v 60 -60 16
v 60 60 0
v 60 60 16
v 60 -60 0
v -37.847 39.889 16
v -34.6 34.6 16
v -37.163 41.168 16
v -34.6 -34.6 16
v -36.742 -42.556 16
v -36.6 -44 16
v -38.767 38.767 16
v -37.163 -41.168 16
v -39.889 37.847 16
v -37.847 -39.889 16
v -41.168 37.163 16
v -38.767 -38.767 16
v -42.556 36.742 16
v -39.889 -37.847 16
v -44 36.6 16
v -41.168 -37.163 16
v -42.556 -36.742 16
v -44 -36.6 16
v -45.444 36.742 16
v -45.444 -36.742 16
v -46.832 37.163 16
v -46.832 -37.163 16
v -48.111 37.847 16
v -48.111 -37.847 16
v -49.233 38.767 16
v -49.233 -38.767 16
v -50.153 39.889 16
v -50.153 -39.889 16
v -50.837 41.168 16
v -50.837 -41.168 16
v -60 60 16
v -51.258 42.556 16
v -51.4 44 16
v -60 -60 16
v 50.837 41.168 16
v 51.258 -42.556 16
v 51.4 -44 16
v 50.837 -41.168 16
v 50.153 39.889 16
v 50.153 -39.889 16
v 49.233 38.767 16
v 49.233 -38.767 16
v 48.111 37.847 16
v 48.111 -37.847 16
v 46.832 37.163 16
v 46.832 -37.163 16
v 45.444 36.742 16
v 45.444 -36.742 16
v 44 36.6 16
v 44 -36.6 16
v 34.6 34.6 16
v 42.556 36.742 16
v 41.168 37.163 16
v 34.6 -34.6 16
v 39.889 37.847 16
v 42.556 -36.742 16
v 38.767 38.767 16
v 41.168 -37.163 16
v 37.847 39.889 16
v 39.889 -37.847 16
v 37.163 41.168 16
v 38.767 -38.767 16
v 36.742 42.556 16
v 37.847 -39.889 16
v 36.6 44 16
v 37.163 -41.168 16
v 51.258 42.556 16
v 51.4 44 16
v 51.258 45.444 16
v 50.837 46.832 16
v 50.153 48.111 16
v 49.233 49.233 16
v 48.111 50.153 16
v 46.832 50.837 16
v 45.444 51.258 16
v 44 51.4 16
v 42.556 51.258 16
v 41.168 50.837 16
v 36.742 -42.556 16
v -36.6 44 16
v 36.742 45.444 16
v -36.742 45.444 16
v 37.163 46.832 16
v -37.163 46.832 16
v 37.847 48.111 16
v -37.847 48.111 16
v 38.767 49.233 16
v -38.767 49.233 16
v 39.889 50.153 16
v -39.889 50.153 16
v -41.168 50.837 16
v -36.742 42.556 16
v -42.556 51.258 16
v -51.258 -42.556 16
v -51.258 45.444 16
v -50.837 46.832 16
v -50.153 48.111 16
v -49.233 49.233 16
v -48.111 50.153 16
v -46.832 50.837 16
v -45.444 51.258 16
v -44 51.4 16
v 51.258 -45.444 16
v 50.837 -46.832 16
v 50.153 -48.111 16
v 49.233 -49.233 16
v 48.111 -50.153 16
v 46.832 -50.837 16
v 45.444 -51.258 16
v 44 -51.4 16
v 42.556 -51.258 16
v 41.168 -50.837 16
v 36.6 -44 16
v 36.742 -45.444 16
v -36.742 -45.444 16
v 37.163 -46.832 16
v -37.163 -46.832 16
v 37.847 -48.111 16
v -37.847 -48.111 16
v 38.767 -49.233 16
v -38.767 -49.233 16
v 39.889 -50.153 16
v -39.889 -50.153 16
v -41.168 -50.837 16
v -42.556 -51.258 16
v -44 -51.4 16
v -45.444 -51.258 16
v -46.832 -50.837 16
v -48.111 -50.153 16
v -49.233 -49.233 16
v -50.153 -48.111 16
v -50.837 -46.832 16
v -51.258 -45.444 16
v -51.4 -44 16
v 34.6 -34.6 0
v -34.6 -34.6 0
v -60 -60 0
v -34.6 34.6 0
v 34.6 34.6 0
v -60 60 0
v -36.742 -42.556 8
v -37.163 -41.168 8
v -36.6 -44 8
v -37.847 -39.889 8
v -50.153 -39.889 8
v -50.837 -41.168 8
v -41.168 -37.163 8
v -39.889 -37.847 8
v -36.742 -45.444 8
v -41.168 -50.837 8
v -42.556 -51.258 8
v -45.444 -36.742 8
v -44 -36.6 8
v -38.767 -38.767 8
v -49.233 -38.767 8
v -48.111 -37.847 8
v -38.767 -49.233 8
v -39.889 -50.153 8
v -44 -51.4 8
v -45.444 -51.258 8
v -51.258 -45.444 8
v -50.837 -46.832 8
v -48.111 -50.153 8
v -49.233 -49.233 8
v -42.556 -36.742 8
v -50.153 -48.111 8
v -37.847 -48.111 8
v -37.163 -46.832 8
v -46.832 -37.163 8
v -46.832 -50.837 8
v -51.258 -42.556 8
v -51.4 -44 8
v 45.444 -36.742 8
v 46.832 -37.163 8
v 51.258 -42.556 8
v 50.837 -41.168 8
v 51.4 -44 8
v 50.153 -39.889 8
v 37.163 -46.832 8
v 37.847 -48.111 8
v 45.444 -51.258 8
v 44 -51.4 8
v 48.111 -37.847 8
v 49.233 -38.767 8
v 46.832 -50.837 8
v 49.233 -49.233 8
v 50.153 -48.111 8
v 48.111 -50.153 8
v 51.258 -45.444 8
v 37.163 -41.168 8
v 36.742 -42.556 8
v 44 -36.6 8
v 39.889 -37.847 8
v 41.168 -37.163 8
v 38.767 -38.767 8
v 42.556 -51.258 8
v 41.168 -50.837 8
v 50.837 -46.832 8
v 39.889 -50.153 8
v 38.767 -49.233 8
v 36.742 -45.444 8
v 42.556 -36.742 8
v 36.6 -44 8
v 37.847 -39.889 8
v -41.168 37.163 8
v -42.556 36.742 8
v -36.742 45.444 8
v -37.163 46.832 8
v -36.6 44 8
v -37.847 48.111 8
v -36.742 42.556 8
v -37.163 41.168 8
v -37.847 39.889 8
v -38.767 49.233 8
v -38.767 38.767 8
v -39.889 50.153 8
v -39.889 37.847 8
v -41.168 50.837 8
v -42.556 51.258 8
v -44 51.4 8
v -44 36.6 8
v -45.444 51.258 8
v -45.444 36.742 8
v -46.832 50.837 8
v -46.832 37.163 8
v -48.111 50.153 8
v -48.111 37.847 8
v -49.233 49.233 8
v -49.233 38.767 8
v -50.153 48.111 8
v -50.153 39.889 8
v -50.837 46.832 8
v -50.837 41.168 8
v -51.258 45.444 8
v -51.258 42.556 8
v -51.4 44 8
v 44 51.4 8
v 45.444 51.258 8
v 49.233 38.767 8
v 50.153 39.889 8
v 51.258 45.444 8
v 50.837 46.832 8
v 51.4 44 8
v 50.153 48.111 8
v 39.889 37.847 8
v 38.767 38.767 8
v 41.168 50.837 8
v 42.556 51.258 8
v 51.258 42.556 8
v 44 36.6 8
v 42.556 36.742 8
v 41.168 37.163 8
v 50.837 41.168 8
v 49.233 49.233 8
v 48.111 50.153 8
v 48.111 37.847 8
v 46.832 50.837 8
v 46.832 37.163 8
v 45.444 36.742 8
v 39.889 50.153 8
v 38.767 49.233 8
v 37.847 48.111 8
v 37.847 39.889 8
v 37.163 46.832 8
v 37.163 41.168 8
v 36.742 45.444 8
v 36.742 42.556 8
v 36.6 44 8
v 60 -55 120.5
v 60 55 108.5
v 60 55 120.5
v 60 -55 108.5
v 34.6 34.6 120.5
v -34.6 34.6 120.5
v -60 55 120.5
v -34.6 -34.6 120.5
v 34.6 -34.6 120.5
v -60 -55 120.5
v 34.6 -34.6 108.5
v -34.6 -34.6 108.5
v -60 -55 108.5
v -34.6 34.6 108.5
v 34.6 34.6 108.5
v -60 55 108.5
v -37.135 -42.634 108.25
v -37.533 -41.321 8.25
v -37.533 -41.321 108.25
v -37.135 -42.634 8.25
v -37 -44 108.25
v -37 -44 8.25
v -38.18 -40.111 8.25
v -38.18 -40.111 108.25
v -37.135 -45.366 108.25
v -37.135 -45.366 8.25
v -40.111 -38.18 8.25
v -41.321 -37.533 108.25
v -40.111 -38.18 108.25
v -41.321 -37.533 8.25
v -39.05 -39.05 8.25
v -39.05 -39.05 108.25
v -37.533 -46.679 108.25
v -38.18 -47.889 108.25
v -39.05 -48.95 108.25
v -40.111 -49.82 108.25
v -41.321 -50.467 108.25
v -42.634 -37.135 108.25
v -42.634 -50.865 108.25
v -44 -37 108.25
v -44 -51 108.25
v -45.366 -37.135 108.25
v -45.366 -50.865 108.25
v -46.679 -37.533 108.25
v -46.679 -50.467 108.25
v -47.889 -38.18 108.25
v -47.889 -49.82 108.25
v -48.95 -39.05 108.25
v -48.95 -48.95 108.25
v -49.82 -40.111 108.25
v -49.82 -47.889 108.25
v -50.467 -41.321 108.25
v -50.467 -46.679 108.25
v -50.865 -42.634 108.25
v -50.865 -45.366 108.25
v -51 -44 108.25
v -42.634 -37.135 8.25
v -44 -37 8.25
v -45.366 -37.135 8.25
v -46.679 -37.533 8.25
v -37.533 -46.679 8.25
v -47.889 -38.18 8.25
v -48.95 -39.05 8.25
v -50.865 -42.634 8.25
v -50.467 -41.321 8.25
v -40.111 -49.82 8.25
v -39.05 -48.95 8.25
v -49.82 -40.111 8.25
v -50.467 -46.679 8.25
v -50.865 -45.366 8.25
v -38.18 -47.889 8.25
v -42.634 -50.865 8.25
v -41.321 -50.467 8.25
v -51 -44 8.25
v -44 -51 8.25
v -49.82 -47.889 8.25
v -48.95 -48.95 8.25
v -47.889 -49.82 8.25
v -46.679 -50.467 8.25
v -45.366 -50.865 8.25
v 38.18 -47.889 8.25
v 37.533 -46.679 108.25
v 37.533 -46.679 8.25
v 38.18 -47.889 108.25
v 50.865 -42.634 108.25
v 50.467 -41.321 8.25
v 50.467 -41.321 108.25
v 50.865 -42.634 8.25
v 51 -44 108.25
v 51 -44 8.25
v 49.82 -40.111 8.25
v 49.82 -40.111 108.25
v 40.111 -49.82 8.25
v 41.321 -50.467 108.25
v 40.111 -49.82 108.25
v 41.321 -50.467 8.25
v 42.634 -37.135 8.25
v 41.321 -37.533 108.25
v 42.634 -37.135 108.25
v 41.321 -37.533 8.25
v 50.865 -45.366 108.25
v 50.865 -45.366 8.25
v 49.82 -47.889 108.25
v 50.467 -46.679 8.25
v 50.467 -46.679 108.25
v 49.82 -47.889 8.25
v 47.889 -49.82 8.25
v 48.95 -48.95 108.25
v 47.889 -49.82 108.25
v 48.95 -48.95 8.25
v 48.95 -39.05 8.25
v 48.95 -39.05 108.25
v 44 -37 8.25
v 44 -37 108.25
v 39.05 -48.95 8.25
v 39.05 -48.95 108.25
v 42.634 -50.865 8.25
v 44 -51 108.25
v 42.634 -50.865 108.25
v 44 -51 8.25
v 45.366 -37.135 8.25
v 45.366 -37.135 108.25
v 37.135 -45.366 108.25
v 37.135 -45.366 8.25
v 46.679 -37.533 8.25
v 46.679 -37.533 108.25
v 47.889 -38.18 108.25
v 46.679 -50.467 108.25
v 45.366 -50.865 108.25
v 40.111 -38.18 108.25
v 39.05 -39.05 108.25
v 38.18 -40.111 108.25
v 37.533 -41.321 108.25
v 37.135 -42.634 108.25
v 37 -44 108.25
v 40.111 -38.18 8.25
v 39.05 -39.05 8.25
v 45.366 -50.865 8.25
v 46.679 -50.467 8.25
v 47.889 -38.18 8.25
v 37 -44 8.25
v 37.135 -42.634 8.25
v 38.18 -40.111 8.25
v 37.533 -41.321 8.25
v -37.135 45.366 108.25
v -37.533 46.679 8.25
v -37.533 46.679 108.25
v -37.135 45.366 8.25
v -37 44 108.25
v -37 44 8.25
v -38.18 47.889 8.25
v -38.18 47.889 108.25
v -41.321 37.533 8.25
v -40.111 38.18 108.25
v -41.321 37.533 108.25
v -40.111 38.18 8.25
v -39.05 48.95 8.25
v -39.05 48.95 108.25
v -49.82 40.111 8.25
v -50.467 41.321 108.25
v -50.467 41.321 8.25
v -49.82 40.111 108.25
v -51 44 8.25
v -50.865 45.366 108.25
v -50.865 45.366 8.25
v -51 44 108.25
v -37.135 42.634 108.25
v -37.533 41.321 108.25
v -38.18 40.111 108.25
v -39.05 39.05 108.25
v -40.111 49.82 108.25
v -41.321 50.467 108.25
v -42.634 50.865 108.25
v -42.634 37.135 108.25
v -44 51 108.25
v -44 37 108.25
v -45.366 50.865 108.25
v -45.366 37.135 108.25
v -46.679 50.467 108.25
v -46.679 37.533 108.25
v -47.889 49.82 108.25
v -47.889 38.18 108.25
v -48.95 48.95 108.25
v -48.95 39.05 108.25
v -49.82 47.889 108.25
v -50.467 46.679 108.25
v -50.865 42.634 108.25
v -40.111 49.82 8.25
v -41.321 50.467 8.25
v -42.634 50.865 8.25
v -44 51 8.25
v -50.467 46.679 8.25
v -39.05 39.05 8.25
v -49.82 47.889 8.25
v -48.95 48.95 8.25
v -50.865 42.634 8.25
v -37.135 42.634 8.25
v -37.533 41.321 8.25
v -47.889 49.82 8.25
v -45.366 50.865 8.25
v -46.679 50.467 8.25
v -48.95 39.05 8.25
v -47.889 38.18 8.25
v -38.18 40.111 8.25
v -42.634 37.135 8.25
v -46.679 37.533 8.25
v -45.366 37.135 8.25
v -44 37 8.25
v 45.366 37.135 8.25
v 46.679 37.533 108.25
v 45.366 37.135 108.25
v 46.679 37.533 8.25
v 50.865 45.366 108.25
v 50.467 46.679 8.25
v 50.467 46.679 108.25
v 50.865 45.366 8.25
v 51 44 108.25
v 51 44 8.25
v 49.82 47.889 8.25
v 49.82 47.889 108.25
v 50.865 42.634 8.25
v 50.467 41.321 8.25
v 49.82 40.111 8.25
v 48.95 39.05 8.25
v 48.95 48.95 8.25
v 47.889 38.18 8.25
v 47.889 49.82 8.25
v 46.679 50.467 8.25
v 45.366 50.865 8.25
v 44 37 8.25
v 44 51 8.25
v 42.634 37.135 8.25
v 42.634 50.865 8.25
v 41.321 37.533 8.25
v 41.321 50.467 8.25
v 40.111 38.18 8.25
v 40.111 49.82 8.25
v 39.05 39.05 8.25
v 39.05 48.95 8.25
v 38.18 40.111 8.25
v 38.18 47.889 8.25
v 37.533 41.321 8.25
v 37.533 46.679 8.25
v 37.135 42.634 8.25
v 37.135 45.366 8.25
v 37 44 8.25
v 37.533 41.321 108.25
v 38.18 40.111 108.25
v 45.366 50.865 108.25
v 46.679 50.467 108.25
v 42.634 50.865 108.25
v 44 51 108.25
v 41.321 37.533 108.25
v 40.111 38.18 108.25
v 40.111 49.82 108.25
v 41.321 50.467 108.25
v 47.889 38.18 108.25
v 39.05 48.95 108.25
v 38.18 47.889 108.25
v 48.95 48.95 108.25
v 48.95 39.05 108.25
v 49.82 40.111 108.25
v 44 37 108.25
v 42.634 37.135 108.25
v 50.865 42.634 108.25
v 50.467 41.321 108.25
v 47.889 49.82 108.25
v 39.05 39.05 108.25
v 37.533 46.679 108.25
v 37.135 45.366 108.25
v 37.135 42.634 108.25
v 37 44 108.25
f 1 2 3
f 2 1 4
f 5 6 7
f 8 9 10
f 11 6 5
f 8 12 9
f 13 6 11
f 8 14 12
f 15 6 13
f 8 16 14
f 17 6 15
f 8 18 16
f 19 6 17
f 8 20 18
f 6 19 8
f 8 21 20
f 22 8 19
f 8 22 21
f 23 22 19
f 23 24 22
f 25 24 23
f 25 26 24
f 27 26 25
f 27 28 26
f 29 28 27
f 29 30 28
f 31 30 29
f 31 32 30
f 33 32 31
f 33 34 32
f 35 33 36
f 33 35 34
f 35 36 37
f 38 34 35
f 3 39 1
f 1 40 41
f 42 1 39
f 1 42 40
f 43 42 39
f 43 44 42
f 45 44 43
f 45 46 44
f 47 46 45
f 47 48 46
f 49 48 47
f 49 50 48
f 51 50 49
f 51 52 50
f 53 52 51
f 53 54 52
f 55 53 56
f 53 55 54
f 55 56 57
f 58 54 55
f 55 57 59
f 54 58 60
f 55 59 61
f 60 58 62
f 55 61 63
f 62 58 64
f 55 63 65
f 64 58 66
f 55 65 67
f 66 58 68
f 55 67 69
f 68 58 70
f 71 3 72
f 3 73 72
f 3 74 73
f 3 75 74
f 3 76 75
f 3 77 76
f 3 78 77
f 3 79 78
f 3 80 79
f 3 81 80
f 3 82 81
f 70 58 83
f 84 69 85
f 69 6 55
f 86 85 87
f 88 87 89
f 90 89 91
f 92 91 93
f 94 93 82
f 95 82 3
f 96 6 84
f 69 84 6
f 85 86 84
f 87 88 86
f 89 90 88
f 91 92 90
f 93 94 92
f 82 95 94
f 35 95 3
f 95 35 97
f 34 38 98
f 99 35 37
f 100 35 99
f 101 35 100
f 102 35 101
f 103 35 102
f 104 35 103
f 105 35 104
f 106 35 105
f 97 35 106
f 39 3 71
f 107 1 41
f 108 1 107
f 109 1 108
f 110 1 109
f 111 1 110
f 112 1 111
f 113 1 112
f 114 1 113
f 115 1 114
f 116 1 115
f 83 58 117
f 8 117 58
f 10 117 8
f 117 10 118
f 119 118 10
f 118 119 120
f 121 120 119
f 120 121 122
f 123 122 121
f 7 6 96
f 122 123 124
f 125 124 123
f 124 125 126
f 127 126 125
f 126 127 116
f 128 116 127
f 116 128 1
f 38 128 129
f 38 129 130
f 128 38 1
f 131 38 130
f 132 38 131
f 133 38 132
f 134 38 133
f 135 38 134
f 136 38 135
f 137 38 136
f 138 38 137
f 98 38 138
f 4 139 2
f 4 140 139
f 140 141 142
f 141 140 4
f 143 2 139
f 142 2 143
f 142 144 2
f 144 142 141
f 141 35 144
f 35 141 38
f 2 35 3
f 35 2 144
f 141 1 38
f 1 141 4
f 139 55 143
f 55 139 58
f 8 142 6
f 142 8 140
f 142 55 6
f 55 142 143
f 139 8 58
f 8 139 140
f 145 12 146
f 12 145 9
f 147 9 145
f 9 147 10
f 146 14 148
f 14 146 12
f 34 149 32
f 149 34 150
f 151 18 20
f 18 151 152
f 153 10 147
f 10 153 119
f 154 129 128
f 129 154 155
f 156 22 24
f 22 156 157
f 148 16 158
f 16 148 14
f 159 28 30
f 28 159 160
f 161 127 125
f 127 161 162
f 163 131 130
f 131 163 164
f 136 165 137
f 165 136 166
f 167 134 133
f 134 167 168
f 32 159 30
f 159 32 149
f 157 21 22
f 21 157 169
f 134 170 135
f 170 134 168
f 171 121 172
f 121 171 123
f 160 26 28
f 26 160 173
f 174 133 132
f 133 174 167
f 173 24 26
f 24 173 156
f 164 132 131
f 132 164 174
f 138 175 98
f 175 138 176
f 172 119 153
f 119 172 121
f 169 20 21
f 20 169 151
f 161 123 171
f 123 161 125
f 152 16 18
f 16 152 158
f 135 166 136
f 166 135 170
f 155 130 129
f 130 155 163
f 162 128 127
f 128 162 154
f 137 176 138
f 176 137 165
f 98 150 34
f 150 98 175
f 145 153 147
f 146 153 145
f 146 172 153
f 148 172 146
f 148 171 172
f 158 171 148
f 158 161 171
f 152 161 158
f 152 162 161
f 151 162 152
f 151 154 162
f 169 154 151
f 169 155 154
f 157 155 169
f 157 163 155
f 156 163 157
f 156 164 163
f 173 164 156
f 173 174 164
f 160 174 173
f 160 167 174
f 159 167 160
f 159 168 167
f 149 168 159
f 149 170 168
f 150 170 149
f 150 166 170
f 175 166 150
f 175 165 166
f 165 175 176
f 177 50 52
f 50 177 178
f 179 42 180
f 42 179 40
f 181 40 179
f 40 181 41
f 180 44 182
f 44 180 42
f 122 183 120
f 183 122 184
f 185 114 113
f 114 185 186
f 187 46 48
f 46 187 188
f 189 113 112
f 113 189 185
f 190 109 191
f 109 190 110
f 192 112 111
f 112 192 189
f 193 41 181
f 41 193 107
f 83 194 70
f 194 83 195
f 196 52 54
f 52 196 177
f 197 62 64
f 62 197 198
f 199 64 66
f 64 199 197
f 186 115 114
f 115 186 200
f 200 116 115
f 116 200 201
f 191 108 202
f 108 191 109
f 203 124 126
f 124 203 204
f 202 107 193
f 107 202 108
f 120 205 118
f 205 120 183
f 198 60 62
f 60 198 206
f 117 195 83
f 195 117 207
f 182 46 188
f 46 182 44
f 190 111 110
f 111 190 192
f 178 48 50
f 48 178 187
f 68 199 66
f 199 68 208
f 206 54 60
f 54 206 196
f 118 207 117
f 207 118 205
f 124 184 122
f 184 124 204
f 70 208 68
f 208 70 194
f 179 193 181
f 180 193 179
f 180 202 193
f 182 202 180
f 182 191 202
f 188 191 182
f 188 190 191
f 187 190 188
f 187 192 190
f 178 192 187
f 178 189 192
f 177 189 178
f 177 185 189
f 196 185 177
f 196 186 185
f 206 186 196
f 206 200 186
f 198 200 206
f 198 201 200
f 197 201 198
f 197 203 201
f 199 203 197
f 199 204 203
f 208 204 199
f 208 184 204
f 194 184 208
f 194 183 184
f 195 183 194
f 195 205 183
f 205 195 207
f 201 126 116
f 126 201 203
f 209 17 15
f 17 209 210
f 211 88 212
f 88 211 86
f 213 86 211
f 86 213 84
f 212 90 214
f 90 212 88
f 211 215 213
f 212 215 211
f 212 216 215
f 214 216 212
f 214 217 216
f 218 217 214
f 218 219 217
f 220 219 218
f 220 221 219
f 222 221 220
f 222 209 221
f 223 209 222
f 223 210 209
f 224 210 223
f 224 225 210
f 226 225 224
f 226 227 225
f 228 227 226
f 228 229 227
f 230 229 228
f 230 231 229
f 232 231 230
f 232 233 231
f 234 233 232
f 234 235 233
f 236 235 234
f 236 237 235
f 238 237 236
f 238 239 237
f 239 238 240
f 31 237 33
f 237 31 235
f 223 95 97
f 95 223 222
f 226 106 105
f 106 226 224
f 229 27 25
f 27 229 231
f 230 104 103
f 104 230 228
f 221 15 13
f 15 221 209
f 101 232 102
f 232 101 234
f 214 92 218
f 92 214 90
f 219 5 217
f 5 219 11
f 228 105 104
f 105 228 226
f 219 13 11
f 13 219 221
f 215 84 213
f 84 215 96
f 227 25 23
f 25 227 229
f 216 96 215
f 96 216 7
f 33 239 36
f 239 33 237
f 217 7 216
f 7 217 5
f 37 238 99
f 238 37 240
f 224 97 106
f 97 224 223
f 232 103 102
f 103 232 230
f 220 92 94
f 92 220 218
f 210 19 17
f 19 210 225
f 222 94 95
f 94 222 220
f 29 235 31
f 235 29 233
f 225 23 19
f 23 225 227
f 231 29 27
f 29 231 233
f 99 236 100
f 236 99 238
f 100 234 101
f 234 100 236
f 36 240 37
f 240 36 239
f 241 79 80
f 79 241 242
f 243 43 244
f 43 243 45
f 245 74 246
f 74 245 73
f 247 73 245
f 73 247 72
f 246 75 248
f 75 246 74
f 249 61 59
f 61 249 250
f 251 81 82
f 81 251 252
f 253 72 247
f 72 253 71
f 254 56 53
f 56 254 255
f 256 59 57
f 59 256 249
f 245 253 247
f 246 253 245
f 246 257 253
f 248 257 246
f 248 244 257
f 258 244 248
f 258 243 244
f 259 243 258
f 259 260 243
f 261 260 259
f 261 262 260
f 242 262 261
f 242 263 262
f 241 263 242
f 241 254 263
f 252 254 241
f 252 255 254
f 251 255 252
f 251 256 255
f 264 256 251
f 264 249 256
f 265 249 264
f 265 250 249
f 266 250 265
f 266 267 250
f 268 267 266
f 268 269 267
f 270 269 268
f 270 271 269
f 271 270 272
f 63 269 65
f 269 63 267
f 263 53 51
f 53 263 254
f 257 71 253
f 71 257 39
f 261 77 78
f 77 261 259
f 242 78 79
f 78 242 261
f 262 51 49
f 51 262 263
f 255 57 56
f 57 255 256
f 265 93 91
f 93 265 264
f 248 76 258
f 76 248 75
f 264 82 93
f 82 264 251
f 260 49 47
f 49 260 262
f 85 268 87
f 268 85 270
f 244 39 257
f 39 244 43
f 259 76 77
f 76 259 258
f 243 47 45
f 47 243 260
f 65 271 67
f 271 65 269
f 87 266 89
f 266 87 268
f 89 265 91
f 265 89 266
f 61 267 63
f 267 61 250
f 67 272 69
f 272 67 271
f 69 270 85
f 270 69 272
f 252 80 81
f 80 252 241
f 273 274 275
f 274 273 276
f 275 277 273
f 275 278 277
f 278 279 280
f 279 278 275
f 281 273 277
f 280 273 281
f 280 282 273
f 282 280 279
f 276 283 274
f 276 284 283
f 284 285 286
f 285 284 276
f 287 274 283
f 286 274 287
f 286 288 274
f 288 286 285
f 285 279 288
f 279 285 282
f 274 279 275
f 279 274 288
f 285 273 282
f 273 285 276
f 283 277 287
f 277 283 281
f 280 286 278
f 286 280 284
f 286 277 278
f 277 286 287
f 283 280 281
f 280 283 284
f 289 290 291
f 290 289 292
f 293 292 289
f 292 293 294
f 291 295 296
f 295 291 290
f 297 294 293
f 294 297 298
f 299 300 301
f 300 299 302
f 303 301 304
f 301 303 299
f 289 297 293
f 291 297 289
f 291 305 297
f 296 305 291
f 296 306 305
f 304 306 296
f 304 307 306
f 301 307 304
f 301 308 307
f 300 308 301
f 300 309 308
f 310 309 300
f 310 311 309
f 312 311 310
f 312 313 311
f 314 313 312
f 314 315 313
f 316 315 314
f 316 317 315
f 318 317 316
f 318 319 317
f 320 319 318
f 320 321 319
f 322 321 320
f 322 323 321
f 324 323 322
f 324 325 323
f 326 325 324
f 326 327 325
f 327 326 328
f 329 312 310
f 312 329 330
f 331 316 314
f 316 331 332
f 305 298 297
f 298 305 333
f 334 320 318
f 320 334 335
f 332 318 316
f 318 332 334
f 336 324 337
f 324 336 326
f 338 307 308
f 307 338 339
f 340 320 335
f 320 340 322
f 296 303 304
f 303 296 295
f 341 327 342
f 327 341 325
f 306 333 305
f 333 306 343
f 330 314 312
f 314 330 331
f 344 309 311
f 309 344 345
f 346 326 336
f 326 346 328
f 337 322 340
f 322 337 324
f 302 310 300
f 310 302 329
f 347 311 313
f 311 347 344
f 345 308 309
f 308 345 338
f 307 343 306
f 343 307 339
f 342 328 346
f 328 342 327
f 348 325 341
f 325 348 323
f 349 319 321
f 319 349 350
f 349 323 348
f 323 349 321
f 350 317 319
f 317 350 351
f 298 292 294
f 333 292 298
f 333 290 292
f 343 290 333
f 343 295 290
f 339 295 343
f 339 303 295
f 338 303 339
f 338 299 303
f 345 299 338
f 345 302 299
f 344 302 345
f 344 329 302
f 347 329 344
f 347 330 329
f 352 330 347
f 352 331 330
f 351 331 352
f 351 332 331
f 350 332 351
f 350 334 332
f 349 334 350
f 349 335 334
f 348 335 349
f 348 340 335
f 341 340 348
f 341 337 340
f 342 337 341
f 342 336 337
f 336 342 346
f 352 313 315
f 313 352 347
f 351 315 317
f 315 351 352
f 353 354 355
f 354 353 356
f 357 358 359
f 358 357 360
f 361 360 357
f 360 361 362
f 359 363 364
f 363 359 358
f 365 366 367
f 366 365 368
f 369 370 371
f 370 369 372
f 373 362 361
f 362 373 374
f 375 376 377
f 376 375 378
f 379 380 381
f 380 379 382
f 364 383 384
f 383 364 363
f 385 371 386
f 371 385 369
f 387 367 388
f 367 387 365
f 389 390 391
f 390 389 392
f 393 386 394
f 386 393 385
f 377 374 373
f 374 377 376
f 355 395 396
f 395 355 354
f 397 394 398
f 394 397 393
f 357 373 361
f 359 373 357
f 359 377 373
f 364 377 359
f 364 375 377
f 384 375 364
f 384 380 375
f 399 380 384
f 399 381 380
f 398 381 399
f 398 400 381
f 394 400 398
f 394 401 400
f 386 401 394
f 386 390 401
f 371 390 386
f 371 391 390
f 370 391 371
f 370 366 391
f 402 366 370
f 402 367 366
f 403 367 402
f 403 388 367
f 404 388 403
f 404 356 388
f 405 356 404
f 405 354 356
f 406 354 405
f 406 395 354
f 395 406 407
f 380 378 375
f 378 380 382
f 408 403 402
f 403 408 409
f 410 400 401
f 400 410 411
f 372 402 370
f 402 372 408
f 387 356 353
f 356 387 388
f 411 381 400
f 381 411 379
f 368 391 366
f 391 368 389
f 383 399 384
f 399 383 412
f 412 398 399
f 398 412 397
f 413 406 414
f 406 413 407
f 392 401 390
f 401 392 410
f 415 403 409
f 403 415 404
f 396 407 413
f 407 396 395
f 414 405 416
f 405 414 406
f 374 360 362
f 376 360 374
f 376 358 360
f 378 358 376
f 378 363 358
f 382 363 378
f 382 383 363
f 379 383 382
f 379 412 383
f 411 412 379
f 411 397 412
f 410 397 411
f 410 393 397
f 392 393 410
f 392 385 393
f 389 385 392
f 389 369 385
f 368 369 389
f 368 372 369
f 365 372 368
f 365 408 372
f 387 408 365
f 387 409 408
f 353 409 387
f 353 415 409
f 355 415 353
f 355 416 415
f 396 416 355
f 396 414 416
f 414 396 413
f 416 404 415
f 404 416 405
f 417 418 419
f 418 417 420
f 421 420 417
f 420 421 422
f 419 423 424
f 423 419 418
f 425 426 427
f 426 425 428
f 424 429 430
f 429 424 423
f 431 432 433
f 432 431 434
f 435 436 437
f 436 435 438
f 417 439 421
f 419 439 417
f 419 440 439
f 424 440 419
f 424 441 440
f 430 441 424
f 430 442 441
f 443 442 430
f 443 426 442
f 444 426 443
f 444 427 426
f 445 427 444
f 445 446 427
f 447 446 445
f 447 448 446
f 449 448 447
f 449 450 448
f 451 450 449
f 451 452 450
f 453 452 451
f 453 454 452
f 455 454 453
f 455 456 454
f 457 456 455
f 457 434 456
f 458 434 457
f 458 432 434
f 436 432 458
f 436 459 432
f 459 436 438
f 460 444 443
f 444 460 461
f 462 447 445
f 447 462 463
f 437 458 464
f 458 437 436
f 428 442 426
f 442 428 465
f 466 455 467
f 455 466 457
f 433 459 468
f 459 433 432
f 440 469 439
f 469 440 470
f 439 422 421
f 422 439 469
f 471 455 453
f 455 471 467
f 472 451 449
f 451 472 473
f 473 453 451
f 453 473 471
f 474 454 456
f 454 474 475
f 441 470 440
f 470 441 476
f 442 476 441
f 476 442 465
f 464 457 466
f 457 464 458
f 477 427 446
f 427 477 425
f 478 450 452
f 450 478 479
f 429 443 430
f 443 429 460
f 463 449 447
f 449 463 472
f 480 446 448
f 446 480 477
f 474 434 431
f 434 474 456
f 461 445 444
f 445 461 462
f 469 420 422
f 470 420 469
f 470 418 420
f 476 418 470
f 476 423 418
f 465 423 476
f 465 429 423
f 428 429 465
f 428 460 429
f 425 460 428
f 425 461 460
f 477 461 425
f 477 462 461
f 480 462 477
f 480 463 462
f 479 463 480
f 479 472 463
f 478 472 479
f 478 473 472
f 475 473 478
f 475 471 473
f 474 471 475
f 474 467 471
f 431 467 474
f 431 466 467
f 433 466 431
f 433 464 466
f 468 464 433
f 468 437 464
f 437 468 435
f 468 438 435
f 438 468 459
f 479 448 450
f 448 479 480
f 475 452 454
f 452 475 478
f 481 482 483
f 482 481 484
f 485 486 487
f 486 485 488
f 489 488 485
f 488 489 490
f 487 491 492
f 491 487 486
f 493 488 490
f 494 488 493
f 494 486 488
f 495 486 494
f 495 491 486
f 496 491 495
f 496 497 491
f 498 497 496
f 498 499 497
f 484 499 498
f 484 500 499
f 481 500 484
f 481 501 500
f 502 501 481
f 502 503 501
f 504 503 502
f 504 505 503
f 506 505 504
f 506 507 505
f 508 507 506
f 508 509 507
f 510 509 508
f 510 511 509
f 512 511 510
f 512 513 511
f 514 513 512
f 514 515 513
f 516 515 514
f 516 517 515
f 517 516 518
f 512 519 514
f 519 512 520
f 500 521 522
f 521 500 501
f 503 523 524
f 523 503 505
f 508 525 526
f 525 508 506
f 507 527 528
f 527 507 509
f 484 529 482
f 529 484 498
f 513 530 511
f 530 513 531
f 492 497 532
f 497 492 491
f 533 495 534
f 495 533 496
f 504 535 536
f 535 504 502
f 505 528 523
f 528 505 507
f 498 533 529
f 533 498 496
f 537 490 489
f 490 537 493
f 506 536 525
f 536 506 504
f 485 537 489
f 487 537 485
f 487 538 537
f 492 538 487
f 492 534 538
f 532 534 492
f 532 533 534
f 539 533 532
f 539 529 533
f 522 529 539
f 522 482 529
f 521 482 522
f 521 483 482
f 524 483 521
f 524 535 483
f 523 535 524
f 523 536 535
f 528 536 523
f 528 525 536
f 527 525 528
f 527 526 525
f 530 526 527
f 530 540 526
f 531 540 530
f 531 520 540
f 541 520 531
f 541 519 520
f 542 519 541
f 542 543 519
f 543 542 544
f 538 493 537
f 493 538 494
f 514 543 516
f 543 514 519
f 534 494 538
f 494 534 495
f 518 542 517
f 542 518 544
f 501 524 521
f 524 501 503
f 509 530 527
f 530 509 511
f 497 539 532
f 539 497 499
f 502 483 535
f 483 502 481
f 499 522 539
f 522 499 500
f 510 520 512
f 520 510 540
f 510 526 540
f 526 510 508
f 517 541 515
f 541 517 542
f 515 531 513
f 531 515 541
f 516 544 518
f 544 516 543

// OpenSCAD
$fn = 32;

// ------------------------------------------------------------------------
// Frame cube: base 120 x 120 mm, posts 100 mm tall
// Every part is its own module, assembly() places every instance.
// ------------------------------------------------------------------------

// --- part 1 ---
module base_frame() {
  difference() {
    translate([-60, -60, 0]) cube([120, 120, 16]);
    translate([-34.6, -34.6, -1]) cube([69.2, 69.2, 18]);
    translate([-44, -44, 8]) cylinder(h = 9, d = 14.8);
    translate([44, -44, 8]) cylinder(h = 9, d = 14.8);
    translate([-44, 44, 8]) cylinder(h = 9, d = 14.8);
    translate([44, 44, 8]) cylinder(h = 9, d = 14.8);
  }
}

// --- part 2 ---
module corner_post() {
  cylinder(h = 100, d = 14);
}

// --- part 3 ---
module top_frame() {
  difference() {
    translate([-60, -55, 0]) cube([120, 110, 12]);
    translate([-34.6, -34.6, -1]) cube([69.2, 69.2, 14]);
  }
}

// --- assembly ---
module assembly() {
  color([0.80, 0.24, 0.20]) translate([0, 0, 0]) rotate([0, 0, 0]) base_frame();
  color([0.20, 0.45, 0.75]) translate([-44, -44, 8.25]) rotate([0, 0, 0]) corner_post();
  color([0.25, 0.62, 0.32]) translate([44, -44, 8.25]) rotate([0, 0, 0]) corner_post();
  color([0.92, 0.70, 0.18]) translate([-44, 44, 8.25]) rotate([0, 0, 0]) corner_post();
  color([0.58, 0.35, 0.70]) translate([44, 44, 8.25]) rotate([0, 0, 0]) corner_post();
  color([0.16, 0.66, 0.66]) translate([0, 0, 108.5]) rotate([0, 0, 0]) top_frame();
}

assembly();
